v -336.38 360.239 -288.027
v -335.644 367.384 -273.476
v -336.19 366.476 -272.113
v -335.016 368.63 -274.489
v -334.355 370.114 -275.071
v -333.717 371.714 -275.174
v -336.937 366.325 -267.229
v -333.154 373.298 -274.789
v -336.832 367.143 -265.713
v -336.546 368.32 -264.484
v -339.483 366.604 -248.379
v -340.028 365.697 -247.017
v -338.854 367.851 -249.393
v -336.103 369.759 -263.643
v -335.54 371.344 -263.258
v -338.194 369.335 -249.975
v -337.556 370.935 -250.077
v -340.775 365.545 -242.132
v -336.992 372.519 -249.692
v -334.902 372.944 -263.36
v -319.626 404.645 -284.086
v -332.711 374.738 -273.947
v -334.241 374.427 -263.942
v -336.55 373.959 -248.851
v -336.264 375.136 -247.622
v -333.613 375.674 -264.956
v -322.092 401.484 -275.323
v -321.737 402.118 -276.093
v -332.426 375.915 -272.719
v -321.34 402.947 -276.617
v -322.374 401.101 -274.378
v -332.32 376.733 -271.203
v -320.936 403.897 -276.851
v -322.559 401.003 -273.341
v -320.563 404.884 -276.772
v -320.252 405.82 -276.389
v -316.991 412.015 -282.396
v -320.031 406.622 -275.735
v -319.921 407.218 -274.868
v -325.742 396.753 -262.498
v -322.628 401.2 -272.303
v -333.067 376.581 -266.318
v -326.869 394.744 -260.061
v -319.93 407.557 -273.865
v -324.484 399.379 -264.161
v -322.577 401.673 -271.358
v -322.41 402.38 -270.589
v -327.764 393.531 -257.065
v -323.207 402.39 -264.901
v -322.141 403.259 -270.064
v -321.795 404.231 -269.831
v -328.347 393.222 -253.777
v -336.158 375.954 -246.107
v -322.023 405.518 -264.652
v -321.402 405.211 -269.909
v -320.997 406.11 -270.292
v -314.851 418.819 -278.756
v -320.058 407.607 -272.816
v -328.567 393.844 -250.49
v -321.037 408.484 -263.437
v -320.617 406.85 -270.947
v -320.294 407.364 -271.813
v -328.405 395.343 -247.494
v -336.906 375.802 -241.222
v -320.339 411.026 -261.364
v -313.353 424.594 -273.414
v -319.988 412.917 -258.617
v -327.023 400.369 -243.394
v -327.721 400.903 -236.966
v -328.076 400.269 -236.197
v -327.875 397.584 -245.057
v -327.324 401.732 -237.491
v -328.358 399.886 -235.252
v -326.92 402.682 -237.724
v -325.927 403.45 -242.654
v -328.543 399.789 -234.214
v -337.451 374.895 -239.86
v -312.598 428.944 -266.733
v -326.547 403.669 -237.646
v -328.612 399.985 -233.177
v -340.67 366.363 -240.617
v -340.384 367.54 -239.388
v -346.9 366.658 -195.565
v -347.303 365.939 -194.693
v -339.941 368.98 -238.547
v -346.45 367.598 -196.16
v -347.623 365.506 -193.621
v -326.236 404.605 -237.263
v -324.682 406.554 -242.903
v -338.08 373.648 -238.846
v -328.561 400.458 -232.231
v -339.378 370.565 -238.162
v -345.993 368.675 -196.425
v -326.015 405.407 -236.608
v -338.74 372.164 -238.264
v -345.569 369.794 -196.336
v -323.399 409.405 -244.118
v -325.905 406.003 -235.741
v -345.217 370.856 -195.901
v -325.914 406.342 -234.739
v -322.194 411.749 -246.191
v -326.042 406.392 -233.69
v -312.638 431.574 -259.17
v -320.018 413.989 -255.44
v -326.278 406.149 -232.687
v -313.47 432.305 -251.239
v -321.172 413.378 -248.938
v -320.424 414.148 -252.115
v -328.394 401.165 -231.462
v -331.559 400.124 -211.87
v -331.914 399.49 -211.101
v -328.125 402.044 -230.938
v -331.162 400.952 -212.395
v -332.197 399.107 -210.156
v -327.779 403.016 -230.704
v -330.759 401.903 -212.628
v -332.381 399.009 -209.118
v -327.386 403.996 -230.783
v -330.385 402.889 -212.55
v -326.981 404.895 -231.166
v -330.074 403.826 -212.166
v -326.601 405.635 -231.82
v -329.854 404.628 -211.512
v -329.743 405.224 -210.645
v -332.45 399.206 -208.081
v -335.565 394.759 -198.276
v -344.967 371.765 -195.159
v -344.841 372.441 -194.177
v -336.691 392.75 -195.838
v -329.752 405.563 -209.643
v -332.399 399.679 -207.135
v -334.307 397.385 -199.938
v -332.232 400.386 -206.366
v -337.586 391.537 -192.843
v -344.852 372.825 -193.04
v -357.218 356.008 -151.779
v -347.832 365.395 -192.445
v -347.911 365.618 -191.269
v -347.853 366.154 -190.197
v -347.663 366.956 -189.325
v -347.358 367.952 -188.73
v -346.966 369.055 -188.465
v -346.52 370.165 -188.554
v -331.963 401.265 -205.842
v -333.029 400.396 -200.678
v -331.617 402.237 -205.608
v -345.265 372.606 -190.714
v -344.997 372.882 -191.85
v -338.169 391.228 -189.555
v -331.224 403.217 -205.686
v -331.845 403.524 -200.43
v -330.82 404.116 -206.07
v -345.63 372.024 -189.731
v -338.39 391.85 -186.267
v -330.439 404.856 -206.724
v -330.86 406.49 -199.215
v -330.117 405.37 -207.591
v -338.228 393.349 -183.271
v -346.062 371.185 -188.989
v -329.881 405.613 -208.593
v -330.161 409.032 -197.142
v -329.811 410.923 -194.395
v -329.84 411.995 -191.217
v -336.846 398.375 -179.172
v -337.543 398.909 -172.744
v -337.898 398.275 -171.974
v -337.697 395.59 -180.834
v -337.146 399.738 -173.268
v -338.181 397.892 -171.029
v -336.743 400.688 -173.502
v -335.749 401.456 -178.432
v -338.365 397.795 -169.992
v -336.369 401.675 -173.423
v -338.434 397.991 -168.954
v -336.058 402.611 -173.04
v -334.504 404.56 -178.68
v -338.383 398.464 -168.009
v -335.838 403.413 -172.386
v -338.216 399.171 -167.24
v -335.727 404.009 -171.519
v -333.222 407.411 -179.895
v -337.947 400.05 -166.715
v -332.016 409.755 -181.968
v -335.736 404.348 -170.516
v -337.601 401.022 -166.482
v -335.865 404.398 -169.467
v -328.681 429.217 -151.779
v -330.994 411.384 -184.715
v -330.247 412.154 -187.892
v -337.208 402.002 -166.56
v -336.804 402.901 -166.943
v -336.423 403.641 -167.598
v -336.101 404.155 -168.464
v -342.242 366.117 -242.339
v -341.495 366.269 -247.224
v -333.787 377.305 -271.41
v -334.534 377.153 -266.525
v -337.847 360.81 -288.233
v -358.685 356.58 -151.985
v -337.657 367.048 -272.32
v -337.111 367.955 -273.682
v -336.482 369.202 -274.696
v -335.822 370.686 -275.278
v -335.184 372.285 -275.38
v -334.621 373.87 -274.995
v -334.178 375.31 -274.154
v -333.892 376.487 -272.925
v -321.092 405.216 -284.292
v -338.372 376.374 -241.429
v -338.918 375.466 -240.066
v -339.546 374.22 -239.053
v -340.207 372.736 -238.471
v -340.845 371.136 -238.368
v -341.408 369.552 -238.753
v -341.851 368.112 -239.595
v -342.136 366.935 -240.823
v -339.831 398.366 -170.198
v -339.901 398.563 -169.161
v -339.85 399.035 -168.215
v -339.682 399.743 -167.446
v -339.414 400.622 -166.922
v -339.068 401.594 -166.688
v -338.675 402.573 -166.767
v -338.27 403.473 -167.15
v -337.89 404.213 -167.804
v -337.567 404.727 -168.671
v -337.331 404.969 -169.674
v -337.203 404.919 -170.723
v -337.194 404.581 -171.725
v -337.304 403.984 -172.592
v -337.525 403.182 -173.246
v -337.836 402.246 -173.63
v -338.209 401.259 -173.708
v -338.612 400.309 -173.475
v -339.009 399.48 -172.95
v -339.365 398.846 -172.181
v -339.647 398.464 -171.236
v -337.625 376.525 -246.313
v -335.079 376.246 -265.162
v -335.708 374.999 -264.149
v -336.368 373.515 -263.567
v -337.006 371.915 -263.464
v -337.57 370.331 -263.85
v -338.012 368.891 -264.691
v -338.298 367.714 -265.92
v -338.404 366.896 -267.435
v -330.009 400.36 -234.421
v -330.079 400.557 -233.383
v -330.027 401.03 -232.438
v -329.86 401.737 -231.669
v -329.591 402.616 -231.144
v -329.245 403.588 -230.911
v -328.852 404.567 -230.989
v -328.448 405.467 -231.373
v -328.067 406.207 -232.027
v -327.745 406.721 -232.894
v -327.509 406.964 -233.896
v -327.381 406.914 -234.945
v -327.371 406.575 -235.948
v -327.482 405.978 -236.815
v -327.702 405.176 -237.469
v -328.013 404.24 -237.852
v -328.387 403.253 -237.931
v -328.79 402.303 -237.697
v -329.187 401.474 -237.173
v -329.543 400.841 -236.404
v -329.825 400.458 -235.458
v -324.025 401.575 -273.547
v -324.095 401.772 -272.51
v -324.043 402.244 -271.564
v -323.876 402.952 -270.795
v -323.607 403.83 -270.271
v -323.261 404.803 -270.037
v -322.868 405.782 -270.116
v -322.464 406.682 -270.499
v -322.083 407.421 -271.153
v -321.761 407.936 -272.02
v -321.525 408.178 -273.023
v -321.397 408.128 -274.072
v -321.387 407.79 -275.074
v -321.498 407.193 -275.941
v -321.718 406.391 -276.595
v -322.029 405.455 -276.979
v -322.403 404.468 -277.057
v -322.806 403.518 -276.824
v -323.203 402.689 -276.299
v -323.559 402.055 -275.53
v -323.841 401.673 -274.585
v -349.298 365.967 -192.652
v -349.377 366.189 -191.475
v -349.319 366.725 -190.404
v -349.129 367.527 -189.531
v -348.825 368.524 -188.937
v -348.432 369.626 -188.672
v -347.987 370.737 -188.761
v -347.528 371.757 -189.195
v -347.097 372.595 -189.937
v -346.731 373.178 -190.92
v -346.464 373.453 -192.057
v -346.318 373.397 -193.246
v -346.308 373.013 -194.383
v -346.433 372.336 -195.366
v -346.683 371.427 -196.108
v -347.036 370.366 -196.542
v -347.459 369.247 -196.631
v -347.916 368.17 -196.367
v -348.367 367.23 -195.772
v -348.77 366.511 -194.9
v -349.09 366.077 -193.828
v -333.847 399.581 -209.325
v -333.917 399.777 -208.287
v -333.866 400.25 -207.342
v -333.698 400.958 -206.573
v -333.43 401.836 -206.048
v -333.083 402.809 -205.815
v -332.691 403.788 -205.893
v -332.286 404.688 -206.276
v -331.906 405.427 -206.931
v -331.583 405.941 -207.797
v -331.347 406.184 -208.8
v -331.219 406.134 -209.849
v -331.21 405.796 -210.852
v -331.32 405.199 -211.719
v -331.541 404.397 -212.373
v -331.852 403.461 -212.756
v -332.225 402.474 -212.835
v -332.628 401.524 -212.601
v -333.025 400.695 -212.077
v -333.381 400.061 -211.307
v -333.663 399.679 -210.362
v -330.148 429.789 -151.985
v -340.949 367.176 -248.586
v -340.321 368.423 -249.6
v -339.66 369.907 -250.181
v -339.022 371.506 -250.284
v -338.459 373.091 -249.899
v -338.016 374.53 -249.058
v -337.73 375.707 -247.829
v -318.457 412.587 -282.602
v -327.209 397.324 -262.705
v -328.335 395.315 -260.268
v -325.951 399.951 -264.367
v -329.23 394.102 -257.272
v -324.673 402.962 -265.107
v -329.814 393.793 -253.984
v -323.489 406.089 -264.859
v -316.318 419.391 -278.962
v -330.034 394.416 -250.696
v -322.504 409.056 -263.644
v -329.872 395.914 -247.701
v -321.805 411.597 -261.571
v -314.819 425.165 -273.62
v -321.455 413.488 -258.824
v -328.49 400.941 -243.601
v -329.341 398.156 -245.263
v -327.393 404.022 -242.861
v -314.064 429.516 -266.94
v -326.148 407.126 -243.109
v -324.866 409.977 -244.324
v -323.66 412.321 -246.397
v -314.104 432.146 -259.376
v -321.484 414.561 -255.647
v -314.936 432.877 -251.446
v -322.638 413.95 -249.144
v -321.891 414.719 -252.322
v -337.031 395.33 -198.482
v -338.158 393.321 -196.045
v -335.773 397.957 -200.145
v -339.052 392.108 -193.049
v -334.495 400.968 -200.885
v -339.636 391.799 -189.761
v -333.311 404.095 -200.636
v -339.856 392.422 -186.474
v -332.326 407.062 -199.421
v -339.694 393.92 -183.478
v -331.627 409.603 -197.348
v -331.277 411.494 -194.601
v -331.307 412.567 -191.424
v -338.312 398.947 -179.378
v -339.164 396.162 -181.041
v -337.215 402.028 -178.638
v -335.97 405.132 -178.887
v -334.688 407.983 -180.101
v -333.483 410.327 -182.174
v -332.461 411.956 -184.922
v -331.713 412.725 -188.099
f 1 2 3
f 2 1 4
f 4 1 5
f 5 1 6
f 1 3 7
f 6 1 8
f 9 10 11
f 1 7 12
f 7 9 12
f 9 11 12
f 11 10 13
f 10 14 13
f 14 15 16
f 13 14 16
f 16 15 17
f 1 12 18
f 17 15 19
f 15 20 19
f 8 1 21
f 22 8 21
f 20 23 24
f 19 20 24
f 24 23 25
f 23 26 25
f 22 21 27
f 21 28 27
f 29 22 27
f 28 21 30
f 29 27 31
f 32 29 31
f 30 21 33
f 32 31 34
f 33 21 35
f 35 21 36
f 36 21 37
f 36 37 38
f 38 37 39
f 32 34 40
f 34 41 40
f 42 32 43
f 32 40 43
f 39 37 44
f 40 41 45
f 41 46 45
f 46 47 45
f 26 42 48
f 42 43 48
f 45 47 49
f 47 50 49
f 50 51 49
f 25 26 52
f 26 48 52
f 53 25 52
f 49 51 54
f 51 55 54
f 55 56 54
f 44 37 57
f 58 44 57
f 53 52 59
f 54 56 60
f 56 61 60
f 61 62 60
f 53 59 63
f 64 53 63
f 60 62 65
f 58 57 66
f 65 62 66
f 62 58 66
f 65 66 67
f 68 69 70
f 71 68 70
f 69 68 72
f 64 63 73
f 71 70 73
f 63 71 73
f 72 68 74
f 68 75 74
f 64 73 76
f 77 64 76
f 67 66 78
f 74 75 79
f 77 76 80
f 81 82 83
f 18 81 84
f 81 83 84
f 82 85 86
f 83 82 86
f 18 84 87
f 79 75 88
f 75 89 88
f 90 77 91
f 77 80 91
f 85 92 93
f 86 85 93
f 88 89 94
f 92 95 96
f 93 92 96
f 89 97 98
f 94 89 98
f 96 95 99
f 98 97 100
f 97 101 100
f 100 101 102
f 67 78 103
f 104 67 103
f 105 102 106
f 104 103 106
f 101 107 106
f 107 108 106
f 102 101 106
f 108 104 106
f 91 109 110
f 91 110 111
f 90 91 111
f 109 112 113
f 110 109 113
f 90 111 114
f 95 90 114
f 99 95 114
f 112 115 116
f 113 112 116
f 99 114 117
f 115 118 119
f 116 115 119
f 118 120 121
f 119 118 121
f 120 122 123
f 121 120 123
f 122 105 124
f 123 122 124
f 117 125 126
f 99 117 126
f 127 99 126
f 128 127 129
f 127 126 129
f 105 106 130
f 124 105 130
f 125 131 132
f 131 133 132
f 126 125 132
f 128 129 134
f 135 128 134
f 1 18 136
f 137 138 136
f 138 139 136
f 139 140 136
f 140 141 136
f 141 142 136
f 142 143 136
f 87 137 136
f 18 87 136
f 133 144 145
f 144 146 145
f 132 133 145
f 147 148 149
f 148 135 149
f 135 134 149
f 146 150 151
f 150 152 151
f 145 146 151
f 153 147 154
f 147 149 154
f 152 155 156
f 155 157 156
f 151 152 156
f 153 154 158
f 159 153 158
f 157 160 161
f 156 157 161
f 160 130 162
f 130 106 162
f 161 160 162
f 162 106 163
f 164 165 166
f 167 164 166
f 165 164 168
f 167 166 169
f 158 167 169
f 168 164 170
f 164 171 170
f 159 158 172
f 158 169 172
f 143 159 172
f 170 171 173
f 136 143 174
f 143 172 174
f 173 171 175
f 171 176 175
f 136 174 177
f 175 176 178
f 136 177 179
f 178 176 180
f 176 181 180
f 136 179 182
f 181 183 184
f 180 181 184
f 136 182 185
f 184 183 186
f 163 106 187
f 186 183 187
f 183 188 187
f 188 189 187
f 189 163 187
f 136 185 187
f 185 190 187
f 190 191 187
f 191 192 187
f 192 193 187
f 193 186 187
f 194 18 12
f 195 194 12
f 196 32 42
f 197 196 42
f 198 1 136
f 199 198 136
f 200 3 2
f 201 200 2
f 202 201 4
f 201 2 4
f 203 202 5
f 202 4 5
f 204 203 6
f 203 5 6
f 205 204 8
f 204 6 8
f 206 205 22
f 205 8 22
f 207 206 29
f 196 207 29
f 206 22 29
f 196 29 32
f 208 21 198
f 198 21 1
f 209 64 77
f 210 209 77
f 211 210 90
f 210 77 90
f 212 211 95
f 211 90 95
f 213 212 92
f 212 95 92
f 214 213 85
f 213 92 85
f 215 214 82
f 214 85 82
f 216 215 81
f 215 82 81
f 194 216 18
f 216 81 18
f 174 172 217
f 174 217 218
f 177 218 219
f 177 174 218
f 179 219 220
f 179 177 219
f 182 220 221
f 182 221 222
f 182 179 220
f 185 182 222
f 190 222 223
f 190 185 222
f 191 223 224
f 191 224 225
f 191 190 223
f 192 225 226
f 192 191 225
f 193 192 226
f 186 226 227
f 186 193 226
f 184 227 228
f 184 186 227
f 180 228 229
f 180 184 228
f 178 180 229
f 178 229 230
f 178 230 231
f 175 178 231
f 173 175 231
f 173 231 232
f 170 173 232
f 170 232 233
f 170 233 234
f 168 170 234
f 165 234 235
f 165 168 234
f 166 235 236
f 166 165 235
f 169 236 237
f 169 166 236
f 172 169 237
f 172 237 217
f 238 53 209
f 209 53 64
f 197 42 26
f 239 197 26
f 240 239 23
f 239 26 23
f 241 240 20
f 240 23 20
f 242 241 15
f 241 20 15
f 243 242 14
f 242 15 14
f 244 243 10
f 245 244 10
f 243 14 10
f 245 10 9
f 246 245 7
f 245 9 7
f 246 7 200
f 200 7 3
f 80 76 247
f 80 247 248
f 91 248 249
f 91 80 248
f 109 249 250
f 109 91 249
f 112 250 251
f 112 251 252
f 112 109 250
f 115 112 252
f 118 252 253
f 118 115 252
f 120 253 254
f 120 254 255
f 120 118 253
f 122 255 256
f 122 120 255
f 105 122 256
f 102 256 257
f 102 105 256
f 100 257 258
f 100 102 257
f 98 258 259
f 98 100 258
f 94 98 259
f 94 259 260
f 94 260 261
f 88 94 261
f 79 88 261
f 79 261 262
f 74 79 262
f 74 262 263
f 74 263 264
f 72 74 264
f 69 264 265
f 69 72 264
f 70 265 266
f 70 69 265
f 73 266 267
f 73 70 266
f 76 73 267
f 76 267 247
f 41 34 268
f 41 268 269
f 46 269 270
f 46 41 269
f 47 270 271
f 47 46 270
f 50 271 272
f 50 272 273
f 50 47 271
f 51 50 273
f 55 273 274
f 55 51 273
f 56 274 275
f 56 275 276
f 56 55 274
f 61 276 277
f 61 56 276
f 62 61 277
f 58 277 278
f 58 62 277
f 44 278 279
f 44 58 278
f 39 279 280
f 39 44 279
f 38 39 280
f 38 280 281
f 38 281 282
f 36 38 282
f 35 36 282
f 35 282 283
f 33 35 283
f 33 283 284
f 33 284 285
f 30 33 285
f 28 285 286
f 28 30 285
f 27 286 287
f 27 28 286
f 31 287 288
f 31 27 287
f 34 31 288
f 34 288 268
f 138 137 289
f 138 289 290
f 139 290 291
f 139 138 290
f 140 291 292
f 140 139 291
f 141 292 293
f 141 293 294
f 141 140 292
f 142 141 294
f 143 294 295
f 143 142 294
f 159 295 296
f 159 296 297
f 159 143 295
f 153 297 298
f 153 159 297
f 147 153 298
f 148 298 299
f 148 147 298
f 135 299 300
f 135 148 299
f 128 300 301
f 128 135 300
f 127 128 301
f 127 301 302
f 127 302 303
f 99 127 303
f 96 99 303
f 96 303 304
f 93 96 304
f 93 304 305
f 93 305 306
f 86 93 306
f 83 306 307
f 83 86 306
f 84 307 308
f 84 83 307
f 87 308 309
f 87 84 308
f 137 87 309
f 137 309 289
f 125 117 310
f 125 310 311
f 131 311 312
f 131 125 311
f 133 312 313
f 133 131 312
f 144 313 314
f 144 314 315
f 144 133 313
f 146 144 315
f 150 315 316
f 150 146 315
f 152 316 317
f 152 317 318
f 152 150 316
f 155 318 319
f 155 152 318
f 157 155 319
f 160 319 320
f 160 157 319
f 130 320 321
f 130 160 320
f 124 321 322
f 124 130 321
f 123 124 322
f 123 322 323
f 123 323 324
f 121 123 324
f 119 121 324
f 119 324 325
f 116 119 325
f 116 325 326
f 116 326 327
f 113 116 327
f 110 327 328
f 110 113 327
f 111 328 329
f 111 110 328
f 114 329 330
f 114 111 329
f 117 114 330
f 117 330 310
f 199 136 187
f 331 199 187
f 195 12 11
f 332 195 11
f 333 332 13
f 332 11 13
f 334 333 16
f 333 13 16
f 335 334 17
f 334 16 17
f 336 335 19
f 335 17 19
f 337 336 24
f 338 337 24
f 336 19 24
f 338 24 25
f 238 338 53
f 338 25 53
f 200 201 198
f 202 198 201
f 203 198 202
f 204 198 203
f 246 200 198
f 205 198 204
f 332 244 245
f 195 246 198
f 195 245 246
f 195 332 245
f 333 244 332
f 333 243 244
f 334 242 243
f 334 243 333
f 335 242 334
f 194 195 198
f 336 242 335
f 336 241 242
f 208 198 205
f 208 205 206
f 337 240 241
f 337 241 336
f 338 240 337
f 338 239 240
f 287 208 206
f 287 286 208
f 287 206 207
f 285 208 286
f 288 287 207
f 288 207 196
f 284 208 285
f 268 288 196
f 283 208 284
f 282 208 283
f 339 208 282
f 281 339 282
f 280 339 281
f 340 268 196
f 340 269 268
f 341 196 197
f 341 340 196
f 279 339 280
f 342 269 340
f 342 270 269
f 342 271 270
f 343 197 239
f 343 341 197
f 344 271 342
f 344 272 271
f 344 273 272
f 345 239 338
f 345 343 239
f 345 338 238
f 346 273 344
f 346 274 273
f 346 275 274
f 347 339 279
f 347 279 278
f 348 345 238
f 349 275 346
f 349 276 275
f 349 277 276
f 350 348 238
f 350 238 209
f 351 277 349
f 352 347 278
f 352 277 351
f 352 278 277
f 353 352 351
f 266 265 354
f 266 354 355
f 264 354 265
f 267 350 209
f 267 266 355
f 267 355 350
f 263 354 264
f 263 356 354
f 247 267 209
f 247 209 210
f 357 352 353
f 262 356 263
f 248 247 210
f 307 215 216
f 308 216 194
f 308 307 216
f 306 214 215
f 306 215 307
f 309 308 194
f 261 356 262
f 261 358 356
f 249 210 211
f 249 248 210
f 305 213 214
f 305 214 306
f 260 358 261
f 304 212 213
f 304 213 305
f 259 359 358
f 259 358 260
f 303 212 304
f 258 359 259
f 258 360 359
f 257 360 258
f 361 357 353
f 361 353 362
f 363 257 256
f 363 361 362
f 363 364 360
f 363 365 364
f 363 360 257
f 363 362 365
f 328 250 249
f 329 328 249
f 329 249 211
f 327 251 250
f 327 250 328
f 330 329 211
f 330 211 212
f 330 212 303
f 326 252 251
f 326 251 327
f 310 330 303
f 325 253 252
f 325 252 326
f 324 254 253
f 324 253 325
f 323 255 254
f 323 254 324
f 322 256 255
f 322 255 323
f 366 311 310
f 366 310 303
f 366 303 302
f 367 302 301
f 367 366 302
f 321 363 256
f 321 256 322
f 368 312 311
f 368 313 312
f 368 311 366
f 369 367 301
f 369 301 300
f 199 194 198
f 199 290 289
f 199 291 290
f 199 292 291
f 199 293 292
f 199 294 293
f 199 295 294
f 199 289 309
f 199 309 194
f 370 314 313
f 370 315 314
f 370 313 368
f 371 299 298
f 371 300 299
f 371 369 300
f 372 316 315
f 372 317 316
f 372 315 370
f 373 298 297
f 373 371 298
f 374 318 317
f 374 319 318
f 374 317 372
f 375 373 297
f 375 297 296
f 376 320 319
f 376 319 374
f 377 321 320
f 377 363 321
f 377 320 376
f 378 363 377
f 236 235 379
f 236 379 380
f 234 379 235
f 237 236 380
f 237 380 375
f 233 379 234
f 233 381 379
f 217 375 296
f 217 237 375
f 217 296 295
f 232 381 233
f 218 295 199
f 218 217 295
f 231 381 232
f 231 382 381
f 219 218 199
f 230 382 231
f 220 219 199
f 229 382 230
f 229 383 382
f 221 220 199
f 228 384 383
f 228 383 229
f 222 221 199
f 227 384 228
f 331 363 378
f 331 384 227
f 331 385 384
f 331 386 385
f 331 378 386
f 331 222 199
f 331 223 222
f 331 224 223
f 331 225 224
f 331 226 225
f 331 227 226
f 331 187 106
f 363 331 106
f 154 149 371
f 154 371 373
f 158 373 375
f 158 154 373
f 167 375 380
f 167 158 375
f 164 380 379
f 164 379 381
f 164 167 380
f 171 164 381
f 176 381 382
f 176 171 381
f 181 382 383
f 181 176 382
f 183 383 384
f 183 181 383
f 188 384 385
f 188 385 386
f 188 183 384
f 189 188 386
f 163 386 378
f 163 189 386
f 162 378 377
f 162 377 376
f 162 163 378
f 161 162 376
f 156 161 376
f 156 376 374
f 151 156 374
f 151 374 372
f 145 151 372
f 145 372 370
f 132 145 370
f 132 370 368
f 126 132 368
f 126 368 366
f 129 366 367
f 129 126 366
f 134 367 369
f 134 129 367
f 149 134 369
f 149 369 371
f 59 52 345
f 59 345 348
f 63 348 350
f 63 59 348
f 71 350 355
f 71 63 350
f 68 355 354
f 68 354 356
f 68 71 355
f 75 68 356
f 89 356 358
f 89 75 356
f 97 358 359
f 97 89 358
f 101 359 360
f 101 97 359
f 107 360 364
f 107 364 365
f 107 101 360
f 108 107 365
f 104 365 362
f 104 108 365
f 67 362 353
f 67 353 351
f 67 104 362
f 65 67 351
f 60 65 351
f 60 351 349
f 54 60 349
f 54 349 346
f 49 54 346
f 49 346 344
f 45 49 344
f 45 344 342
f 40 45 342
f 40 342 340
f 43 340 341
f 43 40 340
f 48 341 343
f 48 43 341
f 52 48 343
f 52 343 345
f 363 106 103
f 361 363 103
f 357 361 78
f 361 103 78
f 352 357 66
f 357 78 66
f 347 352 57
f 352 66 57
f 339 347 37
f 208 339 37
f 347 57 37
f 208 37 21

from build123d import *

# Parameters (mm, degrees)
SKETCH39_R          = 11.25
SKETCH39_R_2        = 3.55
SKETCH39_R_3        = 4.024999951
BOSS_EXTRUDE1_DEPTH = 1.5875


with BuildPart() as part:
    # Sketch39 → Boss-Extrude1 (new body)
    with BuildSketch(Plane(origin=(-441.521969452, 172.104793819, -62.182961286), x_dir=(-0.12122181659134341, 0.04725213510134498, 0.9915001295565519), z_dir=(-0.9237984742451071, 0.3600956621414251, -0.1301056996804562))):
        with BuildLine():
            Line((-227.779978176, 213.473332746), (-90.363815922, 201.963804234))
            Line((-90.363815922, 201.963804234), (-90.363815922, 280.537968932))
            Line((-90.363815922, 280.537968932), (-190.676741831, 288.939851665))
            ThreePointArc((-190.676741831, 288.939851665), (-213.041445426, 281.797087727), (-223.80498218, 260.932157339))
            Line((-223.80498218, 260.932157339), (-227.779978176, 213.473332746))
        make_face()
        with Locations((-128.463815922, 252.946692942)):
            Circle(SKETCH39_R, mode=Mode.SUBTRACT)
        with Locations((-108.73290302, 251.294096181)):
            Circle(SKETCH39_R_2, mode=Mode.SUBTRACT)
        with Locations((-148.194728824, 254.599289703)):
            Circle(SKETCH39_R_2, mode=Mode.SUBTRACT)
        with Locations((-193.237014843, 258.371884328)):
            Circle(SKETCH39_R, mode=Mode.SUBTRACT)
        with Locations((-173.506101941, 256.719287567)):
            Circle(SKETCH39_R_2, mode=Mode.SUBTRACT)
        with Locations((-212.967927745, 260.024481088)):
            Circle(SKETCH39_R_2, mode=Mode.SUBTRACT)
        with Locations((-131.378812986, 218.143554906)):
            Circle(SKETCH39_R_3, mode=Mode.SUBTRACT)
        with BuildLine():
            Line((-210.812041783, 230.315880525), (-205.885245836, 229.903228203))
            ThreePointArc((-205.885245836, 229.903228203), (-202.798738622, 224.125454392), (-206.803355147, 218.941609924))
            Line((-206.803355147, 218.941609924), (-211.730151094, 219.354262246))
            ThreePointArc((-211.730151094, 219.354262246), (-214.816658309, 225.132036057), (-210.812041783, 230.315880525))
        make_face(mode=Mode.SUBTRACT)
        with BuildLine():
            Line((-185.500668667, 228.195882655), (-180.57387272, 227.783230333))
            ThreePointArc((-180.57387272, 227.783230333), (-177.48736551, 222.005456528), (-181.49198203, 216.821612065))
            Line((-181.49198203, 216.821612065), (-186.418777977, 217.234264387))
            ThreePointArc((-186.418777977, 217.234264387), (-189.505285187, 223.012038192), (-185.500668667, 228.195882655))
        make_face(mode=Mode.SUBTRACT)
    extrude(amount=BOSS_EXTRUDE1_DEPTH)


solid = part.part
